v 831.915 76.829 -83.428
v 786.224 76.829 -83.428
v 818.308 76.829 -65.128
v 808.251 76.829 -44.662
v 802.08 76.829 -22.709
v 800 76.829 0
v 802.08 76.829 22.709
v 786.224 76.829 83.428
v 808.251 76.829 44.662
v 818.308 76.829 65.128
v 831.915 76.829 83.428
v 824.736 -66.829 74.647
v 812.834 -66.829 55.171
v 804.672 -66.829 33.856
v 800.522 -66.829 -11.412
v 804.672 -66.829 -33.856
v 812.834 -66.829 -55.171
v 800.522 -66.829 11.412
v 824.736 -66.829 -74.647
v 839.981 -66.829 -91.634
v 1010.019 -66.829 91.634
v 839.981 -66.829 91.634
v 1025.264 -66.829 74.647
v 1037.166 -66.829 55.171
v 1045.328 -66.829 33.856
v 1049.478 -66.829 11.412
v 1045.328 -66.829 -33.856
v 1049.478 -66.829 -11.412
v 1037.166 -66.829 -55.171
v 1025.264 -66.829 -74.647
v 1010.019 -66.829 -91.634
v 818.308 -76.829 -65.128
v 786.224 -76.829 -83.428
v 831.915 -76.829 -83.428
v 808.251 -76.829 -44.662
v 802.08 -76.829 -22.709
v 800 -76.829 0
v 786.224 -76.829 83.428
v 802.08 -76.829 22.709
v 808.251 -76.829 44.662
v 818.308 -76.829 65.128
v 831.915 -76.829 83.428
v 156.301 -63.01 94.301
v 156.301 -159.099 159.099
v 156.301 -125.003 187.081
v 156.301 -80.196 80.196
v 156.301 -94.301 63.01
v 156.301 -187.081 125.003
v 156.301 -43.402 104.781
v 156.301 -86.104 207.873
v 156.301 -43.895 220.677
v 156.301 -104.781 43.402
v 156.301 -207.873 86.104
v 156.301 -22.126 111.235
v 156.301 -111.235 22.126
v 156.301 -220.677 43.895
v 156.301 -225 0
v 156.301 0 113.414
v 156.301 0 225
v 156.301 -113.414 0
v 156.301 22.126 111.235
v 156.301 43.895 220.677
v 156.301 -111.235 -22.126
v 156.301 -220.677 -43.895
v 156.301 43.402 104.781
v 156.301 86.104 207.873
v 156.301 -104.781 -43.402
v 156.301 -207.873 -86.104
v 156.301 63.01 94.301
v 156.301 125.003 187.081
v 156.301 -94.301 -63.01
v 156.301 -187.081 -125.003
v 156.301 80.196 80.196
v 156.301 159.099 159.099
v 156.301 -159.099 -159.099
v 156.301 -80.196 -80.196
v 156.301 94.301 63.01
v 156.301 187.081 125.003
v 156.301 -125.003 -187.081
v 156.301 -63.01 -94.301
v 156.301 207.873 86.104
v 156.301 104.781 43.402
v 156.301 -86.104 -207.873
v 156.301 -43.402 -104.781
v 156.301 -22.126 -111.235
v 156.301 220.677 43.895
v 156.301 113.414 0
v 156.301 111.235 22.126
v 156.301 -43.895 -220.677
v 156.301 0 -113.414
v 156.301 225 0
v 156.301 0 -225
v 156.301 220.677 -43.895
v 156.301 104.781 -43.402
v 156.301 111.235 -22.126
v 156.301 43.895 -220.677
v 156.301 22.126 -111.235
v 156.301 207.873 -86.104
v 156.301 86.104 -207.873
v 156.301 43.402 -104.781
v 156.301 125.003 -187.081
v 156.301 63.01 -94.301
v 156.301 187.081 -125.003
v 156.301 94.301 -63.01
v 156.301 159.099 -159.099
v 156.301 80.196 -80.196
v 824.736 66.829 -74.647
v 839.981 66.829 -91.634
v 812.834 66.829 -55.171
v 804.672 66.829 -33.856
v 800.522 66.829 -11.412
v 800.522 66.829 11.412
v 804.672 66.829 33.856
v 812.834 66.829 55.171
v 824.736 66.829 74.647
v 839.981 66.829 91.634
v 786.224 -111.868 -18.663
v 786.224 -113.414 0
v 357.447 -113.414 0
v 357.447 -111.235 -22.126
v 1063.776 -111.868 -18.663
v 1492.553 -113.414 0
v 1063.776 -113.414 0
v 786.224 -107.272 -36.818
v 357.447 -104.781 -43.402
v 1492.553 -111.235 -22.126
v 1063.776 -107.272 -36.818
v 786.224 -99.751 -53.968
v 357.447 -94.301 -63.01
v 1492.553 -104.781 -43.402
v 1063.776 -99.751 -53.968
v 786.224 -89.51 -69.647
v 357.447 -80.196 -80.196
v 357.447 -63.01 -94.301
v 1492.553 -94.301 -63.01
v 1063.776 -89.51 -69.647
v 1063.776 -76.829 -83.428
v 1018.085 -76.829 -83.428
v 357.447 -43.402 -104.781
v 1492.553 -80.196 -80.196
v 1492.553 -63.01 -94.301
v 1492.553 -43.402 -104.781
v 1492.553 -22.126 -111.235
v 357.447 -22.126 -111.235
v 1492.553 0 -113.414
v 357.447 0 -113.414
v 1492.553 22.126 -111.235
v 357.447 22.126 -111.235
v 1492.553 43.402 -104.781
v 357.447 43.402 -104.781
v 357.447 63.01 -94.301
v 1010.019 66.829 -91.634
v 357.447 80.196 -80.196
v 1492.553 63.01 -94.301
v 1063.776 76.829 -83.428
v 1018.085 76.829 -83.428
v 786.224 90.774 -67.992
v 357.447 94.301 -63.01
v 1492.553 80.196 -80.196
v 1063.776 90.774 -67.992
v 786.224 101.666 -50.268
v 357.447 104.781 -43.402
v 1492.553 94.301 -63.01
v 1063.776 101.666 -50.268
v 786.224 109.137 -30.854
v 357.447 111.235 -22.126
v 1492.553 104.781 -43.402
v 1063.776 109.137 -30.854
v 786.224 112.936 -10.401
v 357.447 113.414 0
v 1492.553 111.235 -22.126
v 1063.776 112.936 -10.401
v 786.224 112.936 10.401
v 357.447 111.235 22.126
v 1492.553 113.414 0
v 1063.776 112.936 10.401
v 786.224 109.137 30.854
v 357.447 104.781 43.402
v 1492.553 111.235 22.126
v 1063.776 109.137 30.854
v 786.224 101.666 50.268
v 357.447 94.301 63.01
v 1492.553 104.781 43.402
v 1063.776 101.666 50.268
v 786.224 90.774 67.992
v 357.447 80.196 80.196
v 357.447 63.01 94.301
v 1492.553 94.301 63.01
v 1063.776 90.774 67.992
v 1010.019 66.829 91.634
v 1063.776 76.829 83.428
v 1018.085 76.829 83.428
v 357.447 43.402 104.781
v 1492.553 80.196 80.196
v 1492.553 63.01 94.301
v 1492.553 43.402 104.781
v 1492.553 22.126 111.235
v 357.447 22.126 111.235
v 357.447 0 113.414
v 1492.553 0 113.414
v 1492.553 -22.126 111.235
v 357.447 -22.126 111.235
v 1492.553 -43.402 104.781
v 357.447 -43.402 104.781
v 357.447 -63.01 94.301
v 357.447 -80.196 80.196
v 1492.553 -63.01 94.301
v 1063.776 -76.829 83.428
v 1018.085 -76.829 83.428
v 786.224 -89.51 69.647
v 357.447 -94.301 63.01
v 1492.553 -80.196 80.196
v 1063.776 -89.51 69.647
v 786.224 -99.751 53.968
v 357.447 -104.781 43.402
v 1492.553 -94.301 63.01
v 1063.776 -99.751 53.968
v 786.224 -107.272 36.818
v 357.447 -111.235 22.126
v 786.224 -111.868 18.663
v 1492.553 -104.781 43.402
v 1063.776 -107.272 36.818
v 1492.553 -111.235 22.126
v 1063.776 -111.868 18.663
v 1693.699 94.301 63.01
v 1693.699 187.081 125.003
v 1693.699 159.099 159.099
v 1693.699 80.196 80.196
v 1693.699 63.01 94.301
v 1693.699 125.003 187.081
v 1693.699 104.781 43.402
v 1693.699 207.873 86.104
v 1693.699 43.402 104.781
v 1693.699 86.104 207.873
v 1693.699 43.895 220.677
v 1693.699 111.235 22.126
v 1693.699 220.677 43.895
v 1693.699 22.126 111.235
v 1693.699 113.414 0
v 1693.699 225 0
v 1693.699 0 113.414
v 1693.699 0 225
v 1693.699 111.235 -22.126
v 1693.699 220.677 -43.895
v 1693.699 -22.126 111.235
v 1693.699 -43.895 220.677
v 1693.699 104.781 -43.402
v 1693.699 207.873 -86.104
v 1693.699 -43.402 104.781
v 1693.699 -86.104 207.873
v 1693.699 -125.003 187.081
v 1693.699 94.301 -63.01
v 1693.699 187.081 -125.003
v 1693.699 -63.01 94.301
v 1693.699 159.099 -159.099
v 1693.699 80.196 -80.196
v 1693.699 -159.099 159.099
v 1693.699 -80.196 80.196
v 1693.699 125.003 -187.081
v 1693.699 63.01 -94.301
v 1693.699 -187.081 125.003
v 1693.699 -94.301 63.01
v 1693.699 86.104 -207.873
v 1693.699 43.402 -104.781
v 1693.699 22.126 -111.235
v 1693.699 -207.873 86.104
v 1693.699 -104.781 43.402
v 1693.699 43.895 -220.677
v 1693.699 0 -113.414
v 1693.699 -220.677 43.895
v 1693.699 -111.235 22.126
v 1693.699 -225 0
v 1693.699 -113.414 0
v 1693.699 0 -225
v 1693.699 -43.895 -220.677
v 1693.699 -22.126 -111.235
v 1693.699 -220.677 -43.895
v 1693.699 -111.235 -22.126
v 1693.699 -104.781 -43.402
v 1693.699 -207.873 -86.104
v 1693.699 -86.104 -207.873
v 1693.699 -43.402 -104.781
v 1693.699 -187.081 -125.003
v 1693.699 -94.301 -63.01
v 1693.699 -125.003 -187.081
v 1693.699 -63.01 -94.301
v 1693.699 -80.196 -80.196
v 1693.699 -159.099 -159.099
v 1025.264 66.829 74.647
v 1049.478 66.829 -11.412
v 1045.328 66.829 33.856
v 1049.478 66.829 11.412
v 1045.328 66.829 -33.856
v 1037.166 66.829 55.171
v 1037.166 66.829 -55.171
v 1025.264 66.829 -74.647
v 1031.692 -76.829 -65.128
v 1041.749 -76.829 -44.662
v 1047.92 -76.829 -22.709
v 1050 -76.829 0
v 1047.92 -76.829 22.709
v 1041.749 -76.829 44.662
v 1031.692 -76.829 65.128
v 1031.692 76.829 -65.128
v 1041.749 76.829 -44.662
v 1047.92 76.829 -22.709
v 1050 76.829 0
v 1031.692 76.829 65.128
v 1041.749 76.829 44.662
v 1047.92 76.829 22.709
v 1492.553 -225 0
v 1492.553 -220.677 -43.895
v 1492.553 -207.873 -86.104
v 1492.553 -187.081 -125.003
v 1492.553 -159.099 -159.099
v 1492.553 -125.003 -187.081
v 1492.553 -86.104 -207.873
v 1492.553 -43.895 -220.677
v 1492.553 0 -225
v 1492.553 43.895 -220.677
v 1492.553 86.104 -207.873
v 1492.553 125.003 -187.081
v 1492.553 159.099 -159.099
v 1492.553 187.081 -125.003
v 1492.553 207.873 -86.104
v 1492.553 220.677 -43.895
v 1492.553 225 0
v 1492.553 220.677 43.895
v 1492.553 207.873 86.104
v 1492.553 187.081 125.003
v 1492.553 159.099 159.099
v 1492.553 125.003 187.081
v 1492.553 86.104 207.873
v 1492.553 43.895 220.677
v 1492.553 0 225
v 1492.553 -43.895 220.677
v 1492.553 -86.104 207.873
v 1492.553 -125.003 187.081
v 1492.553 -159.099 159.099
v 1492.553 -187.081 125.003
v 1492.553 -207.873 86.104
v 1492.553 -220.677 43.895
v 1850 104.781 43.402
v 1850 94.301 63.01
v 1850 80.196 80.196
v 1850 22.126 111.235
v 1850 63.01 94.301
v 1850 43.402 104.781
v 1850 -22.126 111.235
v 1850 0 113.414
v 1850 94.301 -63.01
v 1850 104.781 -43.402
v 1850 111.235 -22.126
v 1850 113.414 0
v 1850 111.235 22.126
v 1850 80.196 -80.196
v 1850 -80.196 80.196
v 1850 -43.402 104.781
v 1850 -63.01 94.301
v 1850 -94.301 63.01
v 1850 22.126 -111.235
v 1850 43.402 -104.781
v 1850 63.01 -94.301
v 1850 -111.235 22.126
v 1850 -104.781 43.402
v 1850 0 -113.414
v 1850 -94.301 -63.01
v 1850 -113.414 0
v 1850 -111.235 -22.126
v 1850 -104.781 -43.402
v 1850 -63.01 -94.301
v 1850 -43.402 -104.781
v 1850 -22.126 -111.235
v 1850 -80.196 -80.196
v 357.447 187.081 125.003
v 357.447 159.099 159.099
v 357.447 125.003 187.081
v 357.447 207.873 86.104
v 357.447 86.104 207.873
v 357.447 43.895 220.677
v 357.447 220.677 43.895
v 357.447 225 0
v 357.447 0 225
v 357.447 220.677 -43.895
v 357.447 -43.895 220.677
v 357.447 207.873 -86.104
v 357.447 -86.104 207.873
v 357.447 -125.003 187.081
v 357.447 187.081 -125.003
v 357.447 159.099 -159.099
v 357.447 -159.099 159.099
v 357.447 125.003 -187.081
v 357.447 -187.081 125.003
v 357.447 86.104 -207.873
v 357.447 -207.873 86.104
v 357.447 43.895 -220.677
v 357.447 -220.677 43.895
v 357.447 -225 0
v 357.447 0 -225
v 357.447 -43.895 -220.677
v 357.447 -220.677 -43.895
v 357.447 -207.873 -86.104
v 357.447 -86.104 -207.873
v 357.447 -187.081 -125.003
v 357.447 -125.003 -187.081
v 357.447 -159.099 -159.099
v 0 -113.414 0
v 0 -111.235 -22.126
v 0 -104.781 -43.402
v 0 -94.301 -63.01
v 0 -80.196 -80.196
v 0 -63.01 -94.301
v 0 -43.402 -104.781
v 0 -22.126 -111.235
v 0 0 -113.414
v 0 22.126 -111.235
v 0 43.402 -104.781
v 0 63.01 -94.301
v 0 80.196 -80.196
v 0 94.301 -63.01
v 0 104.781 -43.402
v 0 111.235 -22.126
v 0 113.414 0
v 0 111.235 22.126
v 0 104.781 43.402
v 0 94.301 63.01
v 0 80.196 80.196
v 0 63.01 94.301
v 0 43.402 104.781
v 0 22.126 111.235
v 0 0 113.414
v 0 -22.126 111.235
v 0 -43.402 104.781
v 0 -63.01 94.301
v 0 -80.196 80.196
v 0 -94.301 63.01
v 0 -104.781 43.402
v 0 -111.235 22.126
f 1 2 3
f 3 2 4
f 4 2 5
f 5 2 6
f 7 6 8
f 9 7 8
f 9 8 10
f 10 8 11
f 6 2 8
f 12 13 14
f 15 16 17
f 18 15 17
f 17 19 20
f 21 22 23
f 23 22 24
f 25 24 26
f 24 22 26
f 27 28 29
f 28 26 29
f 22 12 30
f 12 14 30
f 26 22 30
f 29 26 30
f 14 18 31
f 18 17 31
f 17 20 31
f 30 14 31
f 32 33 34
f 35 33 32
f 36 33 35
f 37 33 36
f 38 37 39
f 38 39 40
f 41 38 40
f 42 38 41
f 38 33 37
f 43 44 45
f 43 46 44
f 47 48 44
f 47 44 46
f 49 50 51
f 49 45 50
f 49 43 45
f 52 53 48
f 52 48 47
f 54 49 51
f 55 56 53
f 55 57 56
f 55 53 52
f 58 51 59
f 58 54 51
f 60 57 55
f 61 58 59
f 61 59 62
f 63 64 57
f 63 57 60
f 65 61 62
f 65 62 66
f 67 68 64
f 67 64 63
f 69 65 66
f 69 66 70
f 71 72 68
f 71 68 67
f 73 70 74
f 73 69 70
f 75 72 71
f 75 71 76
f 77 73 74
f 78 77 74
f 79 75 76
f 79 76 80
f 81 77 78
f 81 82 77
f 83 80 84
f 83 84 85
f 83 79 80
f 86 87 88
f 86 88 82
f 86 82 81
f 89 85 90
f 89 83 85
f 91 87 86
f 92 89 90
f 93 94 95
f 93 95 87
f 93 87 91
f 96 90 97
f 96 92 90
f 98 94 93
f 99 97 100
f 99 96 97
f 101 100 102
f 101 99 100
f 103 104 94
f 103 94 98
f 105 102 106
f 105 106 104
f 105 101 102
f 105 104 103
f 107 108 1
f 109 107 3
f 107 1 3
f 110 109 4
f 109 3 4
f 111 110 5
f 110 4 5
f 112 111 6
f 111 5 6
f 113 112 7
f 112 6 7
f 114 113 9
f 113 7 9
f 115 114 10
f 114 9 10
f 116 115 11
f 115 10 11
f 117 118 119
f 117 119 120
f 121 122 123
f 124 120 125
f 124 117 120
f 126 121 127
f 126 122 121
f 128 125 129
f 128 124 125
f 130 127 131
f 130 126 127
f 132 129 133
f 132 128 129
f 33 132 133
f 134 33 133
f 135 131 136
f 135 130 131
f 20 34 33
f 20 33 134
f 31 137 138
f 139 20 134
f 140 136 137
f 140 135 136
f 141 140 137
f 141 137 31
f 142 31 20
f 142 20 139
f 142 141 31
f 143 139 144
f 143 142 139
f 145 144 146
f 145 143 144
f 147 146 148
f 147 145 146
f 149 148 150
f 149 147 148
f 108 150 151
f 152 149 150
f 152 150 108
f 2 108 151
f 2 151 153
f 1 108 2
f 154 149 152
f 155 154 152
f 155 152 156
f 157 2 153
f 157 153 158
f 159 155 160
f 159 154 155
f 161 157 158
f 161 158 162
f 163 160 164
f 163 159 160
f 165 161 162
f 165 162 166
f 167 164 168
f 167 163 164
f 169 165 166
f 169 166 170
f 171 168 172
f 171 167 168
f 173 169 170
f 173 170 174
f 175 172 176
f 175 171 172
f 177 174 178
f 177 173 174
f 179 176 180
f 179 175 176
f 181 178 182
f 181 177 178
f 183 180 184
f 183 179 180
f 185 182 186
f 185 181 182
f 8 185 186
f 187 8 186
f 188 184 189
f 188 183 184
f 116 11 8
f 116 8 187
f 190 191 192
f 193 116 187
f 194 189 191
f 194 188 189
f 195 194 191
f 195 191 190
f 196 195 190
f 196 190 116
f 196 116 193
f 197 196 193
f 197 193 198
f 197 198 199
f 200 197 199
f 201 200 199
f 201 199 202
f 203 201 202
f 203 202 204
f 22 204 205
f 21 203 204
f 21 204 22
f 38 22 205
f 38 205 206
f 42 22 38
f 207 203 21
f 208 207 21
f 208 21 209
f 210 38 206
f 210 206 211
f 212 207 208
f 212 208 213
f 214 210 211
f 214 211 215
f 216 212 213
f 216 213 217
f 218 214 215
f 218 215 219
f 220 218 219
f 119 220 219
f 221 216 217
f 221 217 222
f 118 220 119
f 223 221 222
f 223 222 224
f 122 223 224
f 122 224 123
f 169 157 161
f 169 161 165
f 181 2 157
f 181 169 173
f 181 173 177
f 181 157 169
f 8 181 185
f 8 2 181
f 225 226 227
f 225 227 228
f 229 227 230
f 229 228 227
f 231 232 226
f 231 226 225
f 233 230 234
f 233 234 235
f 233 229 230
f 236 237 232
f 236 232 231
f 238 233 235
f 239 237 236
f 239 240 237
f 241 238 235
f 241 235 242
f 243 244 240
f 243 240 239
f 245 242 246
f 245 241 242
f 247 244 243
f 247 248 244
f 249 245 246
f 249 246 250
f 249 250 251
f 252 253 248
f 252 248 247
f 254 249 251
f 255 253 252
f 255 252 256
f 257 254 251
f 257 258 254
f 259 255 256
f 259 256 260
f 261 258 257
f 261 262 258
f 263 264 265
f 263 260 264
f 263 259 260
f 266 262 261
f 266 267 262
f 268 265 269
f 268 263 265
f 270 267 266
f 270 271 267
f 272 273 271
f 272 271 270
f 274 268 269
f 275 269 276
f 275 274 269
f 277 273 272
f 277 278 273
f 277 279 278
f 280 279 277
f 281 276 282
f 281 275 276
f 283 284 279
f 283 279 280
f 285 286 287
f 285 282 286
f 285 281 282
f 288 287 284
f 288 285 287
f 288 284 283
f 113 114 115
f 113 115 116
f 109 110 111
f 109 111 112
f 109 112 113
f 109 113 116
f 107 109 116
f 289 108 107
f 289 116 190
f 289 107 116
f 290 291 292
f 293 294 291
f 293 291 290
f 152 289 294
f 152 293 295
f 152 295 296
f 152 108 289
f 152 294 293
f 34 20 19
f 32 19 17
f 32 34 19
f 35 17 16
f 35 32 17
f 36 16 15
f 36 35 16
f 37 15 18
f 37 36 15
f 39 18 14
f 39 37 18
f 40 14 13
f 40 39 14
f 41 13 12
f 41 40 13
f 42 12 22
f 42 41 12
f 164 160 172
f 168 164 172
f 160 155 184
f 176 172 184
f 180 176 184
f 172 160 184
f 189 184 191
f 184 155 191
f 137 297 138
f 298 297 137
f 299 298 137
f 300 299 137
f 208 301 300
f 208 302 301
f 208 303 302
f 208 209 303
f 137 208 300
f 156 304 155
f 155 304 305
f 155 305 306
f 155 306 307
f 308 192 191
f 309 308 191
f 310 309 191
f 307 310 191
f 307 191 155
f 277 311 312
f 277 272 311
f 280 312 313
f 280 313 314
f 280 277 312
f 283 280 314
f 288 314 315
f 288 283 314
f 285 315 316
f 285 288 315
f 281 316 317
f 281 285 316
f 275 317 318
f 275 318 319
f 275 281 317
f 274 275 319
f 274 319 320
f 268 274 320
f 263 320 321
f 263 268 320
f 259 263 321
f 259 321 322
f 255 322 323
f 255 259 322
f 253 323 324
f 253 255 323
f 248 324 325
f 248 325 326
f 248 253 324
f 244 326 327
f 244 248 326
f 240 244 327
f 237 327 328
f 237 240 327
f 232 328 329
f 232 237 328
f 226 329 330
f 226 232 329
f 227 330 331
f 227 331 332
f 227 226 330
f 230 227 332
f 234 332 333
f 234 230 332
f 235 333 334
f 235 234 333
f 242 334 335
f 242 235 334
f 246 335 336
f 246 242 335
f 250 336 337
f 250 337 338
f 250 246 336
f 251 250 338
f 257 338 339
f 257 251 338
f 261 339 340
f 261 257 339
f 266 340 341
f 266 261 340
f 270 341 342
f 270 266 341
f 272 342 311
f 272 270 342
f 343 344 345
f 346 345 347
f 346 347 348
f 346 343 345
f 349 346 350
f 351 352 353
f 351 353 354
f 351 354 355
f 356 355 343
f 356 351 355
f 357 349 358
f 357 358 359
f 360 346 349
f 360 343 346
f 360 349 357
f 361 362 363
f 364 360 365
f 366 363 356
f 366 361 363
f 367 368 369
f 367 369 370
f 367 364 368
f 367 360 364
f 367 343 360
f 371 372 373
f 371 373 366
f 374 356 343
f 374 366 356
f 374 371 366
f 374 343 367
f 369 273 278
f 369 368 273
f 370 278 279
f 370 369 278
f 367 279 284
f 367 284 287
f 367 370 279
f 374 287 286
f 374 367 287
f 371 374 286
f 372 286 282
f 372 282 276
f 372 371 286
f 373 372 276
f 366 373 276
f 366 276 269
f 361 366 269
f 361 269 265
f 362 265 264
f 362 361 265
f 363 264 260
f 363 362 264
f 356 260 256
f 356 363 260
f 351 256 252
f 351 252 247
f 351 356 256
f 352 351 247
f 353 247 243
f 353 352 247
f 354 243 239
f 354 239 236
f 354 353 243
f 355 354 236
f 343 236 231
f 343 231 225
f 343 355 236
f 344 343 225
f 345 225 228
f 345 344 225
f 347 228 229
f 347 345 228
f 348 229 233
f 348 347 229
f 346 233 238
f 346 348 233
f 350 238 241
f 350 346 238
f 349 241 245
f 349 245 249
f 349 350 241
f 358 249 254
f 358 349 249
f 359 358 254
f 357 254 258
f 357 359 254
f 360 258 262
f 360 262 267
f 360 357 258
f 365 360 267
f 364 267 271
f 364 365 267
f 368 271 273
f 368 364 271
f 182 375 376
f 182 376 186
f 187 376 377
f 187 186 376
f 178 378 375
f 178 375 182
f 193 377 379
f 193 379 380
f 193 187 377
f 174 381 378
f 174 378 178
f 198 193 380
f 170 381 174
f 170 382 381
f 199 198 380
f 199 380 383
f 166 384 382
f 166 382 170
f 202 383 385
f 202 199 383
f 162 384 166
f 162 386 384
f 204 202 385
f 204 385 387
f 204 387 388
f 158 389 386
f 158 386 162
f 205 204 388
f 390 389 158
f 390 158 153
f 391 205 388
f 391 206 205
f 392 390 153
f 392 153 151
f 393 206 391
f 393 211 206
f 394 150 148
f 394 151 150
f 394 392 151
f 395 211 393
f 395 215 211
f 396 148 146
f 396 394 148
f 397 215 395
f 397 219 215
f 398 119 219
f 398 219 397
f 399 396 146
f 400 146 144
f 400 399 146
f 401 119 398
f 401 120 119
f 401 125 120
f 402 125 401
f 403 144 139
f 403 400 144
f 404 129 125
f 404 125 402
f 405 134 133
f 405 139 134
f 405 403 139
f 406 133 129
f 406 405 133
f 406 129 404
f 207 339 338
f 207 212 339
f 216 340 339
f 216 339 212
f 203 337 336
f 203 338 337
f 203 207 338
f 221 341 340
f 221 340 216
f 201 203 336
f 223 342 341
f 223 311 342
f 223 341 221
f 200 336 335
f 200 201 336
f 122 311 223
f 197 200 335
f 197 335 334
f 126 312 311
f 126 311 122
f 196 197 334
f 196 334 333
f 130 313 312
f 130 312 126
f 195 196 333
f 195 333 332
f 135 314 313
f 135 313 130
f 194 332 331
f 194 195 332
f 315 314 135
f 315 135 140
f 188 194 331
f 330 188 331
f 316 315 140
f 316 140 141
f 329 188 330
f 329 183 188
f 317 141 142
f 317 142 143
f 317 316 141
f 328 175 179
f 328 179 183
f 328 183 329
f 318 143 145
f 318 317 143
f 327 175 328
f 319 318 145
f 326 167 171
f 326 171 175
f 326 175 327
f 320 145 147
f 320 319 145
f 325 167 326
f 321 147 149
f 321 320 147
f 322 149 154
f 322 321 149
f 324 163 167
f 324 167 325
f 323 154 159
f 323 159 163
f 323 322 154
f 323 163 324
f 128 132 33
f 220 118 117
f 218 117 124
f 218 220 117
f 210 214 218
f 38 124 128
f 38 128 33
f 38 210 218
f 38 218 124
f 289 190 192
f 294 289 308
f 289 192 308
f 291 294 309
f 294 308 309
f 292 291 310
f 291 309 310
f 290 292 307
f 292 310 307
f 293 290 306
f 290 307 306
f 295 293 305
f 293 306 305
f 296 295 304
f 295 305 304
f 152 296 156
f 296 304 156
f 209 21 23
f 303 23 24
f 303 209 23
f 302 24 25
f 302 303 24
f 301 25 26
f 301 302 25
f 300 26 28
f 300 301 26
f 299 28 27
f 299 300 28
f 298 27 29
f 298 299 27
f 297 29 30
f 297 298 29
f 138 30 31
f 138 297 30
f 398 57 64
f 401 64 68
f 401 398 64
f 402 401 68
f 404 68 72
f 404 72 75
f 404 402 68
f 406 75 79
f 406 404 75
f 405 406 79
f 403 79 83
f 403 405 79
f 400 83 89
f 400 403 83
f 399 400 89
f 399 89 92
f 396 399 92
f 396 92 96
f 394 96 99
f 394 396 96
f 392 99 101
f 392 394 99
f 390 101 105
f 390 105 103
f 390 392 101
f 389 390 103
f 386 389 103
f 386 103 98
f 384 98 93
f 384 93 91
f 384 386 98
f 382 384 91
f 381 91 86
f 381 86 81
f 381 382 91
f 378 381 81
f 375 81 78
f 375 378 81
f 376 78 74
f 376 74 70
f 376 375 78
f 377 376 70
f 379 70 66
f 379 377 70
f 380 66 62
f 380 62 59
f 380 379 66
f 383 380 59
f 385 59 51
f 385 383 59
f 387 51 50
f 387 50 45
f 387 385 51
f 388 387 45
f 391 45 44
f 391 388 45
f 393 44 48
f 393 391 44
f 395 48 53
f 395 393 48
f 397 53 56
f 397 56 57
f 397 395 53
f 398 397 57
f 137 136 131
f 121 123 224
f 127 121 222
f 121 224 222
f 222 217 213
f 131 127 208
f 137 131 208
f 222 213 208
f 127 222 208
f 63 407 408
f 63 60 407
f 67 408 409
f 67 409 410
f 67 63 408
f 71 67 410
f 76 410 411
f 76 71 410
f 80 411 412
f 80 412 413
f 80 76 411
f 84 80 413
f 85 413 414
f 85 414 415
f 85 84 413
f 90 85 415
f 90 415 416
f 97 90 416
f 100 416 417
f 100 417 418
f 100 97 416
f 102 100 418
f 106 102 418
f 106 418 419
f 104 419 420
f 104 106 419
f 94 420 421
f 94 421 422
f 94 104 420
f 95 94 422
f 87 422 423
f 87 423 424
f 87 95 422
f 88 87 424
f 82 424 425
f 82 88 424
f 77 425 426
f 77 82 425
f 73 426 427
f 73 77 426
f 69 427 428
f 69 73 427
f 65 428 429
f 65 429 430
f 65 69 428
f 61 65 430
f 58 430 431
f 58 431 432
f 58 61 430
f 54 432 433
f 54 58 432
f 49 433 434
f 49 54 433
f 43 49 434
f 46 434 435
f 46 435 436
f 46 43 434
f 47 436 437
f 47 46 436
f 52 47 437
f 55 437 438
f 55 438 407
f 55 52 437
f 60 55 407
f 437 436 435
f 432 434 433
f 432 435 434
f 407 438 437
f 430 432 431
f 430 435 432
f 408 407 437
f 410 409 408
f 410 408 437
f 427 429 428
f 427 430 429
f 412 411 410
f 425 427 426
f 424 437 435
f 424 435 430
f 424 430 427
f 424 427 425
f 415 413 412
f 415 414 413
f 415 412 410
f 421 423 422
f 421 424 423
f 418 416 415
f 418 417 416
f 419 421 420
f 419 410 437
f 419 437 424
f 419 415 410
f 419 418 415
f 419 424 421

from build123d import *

# Parameters (mm, degrees)
SKETCH2_W          = 277.551020408
SKETCH2_H          = 73.171214091
CUT_EXTRUDE1_DEPTH = 1896.296810529
SKETCH3_R          = 125
CUT_EXTRUDE2_DEPTH = 10


with BuildPart() as part:
    # Sketch1 → Revolve1 (revolve)
    with BuildSketch(Plane.XY, mode=Mode.PRIVATE) as revolve1_sk:
        Polygon((0, 0), (0, 113.414392954), (156.301438496, 113.414392954), (156.301438496, 225), (357.44745317, 225), (357.44745317, 113.414392954), (1492.55254683, 113.414392954), (1492.55254683, 225), (1693.698561504, 225), (1693.698561504, 113.414392954), (1850, 113.414392954), (1850, 0), align=None)
    revolve(revolve1_sk.sketch.rotate(Axis((0, 0, 0), (1, 0, 0)), 180), axis=Axis((0, 0, 0), (1, 0, 0)))

    # Sketch2 → Cut-Extrude1 (cut, through all)
    with BuildSketch(Plane.XY.offset(120)):
        with Locations((925, 113.414392955)):
            Rectangle(SKETCH2_W, SKETCH2_H)
        with Locations((925, -113.414392955)):
            Rectangle(SKETCH2_W, SKETCH2_H)
    extrude(amount=-CUT_EXTRUDE1_DEPTH, mode=Mode.SUBTRACT)

    # Sketch3 → Cut-Extrude2 (cut)
    with BuildSketch(Plane(origin=(0, 76.828785909, 0), x_dir=(1, 0, 0), z_dir=(0, 1, 0))):
        with Locations((925, 0)):
            Circle(SKETCH3_R)
    cut_extrude2 = extrude(amount=-CUT_EXTRUDE2_DEPTH, mode=Mode.SUBTRACT)

    # Mirror1: Cut-Extrude2 across plane
    add(cut_extrude2.mirror(Plane.ZX), mode=Mode.SUBTRACT)


solid = part.part
